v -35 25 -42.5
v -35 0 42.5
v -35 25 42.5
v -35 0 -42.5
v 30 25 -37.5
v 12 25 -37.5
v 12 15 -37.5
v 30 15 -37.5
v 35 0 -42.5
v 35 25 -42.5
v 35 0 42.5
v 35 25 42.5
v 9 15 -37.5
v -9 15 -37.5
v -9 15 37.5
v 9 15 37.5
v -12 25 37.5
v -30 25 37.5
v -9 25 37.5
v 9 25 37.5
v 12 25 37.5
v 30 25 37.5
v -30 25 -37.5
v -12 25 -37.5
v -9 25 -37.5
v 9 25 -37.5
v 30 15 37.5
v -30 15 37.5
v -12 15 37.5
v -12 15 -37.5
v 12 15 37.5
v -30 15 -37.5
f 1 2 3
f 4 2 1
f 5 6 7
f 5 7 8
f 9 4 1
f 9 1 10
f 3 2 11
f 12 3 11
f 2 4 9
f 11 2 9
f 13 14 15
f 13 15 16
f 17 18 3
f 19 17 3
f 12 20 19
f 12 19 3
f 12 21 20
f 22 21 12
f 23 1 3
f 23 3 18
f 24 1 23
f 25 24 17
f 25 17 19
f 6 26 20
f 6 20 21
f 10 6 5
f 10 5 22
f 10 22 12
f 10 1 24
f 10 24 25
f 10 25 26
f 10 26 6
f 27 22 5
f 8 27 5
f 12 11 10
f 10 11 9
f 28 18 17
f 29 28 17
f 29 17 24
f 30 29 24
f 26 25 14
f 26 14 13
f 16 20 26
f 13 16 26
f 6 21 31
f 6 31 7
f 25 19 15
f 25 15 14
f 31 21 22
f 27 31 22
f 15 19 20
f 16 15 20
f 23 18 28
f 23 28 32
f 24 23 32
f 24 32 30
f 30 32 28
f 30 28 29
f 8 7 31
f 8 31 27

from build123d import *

# Parameters (mm, degrees)
SKETCH1_W           = 70
SKETCH1_H           = 85
BOSS_EXTRUDE1_DEPTH = 25
SKETCH2_W           = 18
SKETCH2_H           = 75
CUT_EXTRUDE1_DEPTH  = 10


with BuildPart() as part:
    # Sketch1 → Boss-Extrude1 (new body)
    with BuildSketch(Plane(origin=(0, 0, 0), x_dir=(1, 0, 0), z_dir=(0, 1, 0))):
        Rectangle(SKETCH1_W, SKETCH1_H)
    extrude(amount=BOSS_EXTRUDE1_DEPTH)

    # Sketch2 → Cut-Extrude1 (cut)
    with BuildSketch(Plane(origin=(0, 25, 0), x_dir=(1, 0, 0), z_dir=(0, 1, 0))):
        with Locations((-21, 0)):
            Rectangle(SKETCH2_W, SKETCH2_H)
        Rectangle(SKETCH2_W, SKETCH2_H)
        with Locations((21, 0)):
            Rectangle(SKETCH2_W, SKETCH2_H)
    extrude(amount=-CUT_EXTRUDE1_DEPTH, mode=Mode.SUBTRACT)


solid = part.part
